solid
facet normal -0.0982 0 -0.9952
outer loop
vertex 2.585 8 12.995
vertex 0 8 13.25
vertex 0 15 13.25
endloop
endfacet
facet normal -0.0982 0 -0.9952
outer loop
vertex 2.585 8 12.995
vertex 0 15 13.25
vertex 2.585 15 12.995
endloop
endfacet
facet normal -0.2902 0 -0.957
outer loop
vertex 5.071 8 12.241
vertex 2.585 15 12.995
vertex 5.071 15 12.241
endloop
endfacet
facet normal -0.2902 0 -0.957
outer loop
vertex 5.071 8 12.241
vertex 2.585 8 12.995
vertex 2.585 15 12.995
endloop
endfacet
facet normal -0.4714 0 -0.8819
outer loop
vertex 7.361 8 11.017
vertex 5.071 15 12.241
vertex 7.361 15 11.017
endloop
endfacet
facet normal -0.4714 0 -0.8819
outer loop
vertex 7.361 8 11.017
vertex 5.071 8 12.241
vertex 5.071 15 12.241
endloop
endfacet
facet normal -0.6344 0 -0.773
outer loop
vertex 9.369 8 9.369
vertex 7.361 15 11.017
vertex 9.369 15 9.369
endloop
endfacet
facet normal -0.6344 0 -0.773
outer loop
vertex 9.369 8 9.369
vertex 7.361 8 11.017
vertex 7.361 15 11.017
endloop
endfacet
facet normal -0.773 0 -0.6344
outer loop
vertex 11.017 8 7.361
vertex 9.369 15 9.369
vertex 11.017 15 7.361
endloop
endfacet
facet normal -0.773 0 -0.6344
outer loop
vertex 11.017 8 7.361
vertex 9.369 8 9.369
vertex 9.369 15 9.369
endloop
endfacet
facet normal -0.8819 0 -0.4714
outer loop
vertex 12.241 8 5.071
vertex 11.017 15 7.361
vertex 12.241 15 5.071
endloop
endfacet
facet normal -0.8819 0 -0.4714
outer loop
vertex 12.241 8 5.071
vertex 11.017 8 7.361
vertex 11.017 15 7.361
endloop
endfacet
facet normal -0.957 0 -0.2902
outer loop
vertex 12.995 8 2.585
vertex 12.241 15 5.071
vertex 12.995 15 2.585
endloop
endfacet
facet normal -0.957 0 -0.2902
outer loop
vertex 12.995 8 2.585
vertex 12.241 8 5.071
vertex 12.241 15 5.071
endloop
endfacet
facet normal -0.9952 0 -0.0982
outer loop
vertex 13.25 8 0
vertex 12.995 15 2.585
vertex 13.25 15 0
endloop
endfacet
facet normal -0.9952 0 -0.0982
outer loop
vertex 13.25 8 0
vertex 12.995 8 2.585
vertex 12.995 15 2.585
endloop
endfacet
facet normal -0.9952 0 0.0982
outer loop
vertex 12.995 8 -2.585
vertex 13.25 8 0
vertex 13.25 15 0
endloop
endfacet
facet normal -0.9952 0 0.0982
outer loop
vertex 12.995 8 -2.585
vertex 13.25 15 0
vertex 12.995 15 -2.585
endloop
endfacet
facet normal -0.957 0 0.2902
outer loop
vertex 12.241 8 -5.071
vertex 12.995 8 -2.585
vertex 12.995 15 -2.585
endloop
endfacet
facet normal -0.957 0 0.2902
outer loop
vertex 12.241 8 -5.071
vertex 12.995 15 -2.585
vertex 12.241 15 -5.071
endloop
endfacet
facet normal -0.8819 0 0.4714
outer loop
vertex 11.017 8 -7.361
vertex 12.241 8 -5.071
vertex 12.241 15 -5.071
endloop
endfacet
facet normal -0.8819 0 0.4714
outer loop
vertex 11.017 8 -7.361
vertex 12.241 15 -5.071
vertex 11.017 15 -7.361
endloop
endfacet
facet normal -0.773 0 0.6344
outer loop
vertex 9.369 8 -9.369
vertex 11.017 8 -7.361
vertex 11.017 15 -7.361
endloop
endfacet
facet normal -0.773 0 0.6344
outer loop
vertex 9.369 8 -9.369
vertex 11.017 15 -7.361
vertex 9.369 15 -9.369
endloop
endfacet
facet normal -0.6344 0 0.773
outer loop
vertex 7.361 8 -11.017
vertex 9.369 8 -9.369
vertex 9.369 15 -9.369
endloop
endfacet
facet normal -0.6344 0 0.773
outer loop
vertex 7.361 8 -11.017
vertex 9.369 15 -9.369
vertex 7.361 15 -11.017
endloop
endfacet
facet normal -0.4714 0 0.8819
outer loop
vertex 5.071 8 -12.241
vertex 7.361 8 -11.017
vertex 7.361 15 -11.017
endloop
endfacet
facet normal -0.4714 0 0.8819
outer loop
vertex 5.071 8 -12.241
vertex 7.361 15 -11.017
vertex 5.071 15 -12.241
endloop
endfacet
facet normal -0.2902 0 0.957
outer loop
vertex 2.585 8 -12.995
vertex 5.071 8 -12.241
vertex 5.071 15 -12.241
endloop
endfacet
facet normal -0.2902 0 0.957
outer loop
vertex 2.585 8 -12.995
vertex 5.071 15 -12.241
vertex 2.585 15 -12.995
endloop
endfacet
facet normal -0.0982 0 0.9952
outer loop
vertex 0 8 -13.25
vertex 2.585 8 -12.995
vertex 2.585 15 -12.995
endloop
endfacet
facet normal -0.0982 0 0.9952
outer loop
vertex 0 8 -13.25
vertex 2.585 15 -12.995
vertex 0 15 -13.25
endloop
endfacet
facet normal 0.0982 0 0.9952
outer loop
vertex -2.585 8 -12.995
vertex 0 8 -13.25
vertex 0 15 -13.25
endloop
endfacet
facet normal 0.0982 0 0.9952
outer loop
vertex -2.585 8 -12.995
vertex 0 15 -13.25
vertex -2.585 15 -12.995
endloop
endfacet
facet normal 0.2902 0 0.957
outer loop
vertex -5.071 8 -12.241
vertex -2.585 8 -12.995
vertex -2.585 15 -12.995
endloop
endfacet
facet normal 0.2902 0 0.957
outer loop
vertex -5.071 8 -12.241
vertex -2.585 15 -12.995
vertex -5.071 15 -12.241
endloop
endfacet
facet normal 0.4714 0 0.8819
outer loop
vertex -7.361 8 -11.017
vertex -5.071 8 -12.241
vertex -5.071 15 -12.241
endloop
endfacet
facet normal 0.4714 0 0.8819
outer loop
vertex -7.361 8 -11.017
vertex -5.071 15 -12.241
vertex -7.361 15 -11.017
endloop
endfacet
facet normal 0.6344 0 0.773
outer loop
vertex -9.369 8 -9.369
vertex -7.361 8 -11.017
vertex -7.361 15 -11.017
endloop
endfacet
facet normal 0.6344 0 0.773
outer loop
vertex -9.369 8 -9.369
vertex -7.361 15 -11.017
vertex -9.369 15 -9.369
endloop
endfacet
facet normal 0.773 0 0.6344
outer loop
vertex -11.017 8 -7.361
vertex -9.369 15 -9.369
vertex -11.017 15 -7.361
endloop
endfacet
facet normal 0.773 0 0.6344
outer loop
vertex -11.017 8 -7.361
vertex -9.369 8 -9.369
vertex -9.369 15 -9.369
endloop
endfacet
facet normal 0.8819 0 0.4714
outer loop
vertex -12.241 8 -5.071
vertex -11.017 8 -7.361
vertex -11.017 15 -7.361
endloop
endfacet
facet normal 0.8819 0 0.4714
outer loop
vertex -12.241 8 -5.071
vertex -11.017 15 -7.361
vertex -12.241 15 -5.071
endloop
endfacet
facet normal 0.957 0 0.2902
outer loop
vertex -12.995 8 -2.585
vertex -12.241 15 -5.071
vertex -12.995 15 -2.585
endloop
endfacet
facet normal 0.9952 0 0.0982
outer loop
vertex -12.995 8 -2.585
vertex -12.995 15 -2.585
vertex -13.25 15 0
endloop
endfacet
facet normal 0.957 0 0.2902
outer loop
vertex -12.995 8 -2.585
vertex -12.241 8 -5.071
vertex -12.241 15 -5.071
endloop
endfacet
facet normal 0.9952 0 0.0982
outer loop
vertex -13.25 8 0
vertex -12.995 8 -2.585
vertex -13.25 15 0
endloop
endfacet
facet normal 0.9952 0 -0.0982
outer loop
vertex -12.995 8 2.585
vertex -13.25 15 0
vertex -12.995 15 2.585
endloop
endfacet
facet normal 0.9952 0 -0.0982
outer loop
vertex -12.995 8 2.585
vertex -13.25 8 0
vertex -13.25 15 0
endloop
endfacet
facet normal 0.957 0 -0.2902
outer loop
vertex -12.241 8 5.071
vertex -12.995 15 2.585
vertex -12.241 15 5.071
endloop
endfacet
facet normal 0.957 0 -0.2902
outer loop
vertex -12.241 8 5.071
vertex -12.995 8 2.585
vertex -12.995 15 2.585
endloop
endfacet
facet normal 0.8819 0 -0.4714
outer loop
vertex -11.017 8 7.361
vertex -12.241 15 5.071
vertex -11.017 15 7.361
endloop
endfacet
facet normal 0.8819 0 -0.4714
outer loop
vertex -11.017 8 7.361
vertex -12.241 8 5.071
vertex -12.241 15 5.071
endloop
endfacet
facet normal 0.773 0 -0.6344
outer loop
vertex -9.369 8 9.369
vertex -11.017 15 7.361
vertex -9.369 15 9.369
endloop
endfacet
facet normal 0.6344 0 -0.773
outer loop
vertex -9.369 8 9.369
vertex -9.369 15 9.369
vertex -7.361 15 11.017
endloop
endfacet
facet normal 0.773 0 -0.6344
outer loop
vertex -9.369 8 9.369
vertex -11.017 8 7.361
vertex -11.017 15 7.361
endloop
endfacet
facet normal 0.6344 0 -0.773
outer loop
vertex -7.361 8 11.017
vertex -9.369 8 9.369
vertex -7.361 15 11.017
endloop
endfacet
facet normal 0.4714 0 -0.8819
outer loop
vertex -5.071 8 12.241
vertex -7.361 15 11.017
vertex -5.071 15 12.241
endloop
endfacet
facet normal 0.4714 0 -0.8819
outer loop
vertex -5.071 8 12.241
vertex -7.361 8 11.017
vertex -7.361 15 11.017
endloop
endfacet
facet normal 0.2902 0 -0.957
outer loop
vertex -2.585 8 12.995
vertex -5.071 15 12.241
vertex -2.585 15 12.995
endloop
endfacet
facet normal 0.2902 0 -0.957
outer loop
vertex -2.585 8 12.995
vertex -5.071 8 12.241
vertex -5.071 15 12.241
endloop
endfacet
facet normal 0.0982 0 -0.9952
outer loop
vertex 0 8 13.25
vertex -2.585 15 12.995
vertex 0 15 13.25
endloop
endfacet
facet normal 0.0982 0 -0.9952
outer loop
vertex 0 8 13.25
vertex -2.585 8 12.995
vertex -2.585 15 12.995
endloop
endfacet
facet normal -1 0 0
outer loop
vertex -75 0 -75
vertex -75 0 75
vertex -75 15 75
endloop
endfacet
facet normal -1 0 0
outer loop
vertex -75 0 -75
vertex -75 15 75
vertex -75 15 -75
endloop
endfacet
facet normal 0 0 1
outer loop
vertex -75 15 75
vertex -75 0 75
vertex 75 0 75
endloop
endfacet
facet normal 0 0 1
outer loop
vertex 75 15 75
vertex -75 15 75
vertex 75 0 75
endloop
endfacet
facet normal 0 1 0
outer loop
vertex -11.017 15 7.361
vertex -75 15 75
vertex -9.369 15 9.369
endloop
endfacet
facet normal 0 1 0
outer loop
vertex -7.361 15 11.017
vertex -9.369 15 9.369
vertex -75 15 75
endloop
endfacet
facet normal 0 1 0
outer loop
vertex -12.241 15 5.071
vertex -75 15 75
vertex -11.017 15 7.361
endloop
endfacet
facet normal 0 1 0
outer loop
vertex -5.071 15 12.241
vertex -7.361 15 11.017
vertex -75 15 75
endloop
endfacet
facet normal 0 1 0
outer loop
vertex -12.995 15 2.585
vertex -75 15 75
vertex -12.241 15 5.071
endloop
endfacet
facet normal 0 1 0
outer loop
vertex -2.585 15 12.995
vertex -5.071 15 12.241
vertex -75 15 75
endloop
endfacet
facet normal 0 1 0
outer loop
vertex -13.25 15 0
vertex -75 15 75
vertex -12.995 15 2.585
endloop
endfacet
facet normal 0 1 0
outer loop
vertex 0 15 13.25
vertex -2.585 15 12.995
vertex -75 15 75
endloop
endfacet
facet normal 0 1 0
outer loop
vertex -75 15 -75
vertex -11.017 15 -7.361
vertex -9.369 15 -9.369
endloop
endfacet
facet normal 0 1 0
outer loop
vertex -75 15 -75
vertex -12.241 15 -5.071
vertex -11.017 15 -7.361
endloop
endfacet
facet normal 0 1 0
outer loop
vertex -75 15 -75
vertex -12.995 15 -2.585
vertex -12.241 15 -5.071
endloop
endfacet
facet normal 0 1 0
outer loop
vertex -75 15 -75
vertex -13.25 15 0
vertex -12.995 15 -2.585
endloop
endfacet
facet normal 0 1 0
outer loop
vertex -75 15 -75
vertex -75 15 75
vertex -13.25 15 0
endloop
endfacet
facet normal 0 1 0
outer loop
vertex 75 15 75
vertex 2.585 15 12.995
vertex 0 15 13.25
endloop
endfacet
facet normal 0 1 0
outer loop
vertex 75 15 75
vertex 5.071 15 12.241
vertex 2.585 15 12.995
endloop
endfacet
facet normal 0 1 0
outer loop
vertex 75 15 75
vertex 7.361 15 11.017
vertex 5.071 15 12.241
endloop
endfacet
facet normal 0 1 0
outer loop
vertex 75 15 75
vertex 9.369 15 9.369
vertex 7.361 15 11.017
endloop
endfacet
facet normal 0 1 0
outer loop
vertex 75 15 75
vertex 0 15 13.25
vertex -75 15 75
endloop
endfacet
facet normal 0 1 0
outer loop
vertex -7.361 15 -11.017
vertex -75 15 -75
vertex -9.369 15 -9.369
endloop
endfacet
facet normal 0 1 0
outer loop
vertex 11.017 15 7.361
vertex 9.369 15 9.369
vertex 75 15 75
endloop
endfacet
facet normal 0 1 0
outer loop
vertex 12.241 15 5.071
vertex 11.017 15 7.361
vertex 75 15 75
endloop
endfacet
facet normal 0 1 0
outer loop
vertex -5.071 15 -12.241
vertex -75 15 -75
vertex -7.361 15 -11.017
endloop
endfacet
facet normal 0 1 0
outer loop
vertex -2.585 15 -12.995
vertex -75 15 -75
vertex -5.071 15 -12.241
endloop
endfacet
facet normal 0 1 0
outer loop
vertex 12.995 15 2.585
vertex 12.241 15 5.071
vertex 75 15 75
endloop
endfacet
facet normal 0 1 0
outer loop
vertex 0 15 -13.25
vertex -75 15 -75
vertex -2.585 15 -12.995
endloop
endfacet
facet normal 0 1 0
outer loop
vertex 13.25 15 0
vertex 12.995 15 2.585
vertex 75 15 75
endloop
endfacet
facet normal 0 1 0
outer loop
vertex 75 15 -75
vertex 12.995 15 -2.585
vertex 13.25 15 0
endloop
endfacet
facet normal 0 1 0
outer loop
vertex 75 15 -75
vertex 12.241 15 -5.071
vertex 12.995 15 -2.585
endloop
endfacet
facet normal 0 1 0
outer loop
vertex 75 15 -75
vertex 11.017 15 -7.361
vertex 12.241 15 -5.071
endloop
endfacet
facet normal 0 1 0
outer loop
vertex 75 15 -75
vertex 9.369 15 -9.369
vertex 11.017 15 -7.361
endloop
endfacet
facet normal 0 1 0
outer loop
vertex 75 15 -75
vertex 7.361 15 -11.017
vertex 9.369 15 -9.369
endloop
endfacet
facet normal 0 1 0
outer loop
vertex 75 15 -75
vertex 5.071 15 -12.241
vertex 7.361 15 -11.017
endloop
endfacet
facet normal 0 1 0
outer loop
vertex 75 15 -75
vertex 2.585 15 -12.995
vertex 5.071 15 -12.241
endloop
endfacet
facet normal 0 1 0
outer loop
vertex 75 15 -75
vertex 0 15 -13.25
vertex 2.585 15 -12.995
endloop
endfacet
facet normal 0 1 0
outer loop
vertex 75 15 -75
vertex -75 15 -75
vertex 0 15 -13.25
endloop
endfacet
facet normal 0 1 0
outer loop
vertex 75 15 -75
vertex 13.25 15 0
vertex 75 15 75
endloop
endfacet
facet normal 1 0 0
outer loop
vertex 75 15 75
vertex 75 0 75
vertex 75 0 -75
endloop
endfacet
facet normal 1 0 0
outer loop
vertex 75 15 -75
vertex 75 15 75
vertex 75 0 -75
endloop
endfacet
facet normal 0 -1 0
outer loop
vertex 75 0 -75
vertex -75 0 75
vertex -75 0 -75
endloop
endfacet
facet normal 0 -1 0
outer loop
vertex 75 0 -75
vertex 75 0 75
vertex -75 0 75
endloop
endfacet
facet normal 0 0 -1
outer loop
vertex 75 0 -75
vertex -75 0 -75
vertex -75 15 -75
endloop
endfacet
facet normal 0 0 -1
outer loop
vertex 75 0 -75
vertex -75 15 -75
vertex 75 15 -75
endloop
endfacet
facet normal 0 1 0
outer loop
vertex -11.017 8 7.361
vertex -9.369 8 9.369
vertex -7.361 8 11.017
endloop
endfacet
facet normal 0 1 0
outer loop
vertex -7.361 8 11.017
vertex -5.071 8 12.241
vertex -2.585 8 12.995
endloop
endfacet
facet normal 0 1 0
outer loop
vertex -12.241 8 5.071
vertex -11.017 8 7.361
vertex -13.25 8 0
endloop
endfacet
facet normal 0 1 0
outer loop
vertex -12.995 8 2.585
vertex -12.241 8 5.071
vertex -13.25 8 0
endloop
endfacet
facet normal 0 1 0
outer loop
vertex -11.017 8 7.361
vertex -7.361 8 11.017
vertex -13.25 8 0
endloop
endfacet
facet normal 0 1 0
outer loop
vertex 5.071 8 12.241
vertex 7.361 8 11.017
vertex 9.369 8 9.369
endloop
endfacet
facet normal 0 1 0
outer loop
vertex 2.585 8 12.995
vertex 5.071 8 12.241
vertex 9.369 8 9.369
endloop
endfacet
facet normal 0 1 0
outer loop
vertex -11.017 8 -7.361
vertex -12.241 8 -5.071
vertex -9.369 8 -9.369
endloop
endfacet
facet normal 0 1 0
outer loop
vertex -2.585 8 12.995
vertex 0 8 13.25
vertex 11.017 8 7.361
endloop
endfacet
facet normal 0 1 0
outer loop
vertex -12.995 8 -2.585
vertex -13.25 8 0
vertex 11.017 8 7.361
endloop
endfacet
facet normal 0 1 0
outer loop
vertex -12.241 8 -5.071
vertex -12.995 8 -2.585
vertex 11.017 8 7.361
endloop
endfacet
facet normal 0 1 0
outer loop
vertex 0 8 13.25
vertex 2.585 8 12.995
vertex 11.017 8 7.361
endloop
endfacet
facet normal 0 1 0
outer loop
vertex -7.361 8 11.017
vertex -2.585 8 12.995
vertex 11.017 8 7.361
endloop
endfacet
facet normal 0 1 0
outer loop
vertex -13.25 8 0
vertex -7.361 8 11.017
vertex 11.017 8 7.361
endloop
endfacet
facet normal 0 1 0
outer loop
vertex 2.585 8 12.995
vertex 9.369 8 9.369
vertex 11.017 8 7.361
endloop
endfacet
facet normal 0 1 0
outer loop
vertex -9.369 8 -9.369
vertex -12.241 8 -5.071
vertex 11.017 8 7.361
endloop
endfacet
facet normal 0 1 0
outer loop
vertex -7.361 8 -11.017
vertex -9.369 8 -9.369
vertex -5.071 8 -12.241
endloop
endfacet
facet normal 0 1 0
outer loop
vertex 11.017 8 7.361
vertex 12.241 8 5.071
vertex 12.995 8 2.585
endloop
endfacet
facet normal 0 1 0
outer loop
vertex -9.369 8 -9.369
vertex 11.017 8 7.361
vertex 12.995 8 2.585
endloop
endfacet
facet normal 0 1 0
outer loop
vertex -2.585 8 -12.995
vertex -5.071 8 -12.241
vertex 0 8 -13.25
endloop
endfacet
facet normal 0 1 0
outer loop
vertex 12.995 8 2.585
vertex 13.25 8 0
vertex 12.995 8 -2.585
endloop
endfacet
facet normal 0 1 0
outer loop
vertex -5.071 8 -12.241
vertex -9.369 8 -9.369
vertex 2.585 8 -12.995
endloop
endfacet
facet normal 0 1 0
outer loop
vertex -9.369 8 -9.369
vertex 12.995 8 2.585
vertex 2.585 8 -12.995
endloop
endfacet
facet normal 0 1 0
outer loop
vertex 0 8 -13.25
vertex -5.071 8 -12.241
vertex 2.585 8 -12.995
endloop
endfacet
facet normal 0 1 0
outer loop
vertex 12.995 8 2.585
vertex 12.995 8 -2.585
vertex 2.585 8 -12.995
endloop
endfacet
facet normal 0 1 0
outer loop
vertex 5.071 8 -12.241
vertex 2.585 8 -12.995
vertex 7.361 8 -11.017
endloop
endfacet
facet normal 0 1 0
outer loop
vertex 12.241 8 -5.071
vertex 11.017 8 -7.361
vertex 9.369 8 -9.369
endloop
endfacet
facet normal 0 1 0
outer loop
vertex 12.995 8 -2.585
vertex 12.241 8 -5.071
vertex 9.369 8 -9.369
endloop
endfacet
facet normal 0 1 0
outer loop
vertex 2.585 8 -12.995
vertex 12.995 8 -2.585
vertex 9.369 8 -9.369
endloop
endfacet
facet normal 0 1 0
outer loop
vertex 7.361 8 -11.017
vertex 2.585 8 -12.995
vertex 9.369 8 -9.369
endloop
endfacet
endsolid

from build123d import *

# Parameters (mm, degrees)
SKETCH1_W           = 150
SKETCH1_H           = 150
SKETCH1_R           = 13.25
BOSS_EXTRUDE1_DEPTH = 15
SKETCH2_R           = 13.25
BOSS_EXTRUDE2_DEPTH = 8


with BuildPart() as part:
    # Sketch1 → Boss-Extrude1 (new body)
    with BuildSketch(Plane(origin=(0, 0, 0), x_dir=(1, 0, 0), z_dir=(0, 1, 0))):
        Rectangle(SKETCH1_W, SKETCH1_H)
        with Locations(Location((0, 0, 0), (0, 0, 270))):
            Circle(SKETCH1_R, mode=Mode.SUBTRACT)
    extrude(amount=BOSS_EXTRUDE1_DEPTH)

    # Sketch2 → Boss-Extrude2 (add)
    with BuildSketch(Plane.XZ):
        with Locations(Location((0, 0, 0), (0, 0, 270))):
            Circle(SKETCH2_R)
    extrude(amount=-BOSS_EXTRUDE2_DEPTH)


solid = part.part
